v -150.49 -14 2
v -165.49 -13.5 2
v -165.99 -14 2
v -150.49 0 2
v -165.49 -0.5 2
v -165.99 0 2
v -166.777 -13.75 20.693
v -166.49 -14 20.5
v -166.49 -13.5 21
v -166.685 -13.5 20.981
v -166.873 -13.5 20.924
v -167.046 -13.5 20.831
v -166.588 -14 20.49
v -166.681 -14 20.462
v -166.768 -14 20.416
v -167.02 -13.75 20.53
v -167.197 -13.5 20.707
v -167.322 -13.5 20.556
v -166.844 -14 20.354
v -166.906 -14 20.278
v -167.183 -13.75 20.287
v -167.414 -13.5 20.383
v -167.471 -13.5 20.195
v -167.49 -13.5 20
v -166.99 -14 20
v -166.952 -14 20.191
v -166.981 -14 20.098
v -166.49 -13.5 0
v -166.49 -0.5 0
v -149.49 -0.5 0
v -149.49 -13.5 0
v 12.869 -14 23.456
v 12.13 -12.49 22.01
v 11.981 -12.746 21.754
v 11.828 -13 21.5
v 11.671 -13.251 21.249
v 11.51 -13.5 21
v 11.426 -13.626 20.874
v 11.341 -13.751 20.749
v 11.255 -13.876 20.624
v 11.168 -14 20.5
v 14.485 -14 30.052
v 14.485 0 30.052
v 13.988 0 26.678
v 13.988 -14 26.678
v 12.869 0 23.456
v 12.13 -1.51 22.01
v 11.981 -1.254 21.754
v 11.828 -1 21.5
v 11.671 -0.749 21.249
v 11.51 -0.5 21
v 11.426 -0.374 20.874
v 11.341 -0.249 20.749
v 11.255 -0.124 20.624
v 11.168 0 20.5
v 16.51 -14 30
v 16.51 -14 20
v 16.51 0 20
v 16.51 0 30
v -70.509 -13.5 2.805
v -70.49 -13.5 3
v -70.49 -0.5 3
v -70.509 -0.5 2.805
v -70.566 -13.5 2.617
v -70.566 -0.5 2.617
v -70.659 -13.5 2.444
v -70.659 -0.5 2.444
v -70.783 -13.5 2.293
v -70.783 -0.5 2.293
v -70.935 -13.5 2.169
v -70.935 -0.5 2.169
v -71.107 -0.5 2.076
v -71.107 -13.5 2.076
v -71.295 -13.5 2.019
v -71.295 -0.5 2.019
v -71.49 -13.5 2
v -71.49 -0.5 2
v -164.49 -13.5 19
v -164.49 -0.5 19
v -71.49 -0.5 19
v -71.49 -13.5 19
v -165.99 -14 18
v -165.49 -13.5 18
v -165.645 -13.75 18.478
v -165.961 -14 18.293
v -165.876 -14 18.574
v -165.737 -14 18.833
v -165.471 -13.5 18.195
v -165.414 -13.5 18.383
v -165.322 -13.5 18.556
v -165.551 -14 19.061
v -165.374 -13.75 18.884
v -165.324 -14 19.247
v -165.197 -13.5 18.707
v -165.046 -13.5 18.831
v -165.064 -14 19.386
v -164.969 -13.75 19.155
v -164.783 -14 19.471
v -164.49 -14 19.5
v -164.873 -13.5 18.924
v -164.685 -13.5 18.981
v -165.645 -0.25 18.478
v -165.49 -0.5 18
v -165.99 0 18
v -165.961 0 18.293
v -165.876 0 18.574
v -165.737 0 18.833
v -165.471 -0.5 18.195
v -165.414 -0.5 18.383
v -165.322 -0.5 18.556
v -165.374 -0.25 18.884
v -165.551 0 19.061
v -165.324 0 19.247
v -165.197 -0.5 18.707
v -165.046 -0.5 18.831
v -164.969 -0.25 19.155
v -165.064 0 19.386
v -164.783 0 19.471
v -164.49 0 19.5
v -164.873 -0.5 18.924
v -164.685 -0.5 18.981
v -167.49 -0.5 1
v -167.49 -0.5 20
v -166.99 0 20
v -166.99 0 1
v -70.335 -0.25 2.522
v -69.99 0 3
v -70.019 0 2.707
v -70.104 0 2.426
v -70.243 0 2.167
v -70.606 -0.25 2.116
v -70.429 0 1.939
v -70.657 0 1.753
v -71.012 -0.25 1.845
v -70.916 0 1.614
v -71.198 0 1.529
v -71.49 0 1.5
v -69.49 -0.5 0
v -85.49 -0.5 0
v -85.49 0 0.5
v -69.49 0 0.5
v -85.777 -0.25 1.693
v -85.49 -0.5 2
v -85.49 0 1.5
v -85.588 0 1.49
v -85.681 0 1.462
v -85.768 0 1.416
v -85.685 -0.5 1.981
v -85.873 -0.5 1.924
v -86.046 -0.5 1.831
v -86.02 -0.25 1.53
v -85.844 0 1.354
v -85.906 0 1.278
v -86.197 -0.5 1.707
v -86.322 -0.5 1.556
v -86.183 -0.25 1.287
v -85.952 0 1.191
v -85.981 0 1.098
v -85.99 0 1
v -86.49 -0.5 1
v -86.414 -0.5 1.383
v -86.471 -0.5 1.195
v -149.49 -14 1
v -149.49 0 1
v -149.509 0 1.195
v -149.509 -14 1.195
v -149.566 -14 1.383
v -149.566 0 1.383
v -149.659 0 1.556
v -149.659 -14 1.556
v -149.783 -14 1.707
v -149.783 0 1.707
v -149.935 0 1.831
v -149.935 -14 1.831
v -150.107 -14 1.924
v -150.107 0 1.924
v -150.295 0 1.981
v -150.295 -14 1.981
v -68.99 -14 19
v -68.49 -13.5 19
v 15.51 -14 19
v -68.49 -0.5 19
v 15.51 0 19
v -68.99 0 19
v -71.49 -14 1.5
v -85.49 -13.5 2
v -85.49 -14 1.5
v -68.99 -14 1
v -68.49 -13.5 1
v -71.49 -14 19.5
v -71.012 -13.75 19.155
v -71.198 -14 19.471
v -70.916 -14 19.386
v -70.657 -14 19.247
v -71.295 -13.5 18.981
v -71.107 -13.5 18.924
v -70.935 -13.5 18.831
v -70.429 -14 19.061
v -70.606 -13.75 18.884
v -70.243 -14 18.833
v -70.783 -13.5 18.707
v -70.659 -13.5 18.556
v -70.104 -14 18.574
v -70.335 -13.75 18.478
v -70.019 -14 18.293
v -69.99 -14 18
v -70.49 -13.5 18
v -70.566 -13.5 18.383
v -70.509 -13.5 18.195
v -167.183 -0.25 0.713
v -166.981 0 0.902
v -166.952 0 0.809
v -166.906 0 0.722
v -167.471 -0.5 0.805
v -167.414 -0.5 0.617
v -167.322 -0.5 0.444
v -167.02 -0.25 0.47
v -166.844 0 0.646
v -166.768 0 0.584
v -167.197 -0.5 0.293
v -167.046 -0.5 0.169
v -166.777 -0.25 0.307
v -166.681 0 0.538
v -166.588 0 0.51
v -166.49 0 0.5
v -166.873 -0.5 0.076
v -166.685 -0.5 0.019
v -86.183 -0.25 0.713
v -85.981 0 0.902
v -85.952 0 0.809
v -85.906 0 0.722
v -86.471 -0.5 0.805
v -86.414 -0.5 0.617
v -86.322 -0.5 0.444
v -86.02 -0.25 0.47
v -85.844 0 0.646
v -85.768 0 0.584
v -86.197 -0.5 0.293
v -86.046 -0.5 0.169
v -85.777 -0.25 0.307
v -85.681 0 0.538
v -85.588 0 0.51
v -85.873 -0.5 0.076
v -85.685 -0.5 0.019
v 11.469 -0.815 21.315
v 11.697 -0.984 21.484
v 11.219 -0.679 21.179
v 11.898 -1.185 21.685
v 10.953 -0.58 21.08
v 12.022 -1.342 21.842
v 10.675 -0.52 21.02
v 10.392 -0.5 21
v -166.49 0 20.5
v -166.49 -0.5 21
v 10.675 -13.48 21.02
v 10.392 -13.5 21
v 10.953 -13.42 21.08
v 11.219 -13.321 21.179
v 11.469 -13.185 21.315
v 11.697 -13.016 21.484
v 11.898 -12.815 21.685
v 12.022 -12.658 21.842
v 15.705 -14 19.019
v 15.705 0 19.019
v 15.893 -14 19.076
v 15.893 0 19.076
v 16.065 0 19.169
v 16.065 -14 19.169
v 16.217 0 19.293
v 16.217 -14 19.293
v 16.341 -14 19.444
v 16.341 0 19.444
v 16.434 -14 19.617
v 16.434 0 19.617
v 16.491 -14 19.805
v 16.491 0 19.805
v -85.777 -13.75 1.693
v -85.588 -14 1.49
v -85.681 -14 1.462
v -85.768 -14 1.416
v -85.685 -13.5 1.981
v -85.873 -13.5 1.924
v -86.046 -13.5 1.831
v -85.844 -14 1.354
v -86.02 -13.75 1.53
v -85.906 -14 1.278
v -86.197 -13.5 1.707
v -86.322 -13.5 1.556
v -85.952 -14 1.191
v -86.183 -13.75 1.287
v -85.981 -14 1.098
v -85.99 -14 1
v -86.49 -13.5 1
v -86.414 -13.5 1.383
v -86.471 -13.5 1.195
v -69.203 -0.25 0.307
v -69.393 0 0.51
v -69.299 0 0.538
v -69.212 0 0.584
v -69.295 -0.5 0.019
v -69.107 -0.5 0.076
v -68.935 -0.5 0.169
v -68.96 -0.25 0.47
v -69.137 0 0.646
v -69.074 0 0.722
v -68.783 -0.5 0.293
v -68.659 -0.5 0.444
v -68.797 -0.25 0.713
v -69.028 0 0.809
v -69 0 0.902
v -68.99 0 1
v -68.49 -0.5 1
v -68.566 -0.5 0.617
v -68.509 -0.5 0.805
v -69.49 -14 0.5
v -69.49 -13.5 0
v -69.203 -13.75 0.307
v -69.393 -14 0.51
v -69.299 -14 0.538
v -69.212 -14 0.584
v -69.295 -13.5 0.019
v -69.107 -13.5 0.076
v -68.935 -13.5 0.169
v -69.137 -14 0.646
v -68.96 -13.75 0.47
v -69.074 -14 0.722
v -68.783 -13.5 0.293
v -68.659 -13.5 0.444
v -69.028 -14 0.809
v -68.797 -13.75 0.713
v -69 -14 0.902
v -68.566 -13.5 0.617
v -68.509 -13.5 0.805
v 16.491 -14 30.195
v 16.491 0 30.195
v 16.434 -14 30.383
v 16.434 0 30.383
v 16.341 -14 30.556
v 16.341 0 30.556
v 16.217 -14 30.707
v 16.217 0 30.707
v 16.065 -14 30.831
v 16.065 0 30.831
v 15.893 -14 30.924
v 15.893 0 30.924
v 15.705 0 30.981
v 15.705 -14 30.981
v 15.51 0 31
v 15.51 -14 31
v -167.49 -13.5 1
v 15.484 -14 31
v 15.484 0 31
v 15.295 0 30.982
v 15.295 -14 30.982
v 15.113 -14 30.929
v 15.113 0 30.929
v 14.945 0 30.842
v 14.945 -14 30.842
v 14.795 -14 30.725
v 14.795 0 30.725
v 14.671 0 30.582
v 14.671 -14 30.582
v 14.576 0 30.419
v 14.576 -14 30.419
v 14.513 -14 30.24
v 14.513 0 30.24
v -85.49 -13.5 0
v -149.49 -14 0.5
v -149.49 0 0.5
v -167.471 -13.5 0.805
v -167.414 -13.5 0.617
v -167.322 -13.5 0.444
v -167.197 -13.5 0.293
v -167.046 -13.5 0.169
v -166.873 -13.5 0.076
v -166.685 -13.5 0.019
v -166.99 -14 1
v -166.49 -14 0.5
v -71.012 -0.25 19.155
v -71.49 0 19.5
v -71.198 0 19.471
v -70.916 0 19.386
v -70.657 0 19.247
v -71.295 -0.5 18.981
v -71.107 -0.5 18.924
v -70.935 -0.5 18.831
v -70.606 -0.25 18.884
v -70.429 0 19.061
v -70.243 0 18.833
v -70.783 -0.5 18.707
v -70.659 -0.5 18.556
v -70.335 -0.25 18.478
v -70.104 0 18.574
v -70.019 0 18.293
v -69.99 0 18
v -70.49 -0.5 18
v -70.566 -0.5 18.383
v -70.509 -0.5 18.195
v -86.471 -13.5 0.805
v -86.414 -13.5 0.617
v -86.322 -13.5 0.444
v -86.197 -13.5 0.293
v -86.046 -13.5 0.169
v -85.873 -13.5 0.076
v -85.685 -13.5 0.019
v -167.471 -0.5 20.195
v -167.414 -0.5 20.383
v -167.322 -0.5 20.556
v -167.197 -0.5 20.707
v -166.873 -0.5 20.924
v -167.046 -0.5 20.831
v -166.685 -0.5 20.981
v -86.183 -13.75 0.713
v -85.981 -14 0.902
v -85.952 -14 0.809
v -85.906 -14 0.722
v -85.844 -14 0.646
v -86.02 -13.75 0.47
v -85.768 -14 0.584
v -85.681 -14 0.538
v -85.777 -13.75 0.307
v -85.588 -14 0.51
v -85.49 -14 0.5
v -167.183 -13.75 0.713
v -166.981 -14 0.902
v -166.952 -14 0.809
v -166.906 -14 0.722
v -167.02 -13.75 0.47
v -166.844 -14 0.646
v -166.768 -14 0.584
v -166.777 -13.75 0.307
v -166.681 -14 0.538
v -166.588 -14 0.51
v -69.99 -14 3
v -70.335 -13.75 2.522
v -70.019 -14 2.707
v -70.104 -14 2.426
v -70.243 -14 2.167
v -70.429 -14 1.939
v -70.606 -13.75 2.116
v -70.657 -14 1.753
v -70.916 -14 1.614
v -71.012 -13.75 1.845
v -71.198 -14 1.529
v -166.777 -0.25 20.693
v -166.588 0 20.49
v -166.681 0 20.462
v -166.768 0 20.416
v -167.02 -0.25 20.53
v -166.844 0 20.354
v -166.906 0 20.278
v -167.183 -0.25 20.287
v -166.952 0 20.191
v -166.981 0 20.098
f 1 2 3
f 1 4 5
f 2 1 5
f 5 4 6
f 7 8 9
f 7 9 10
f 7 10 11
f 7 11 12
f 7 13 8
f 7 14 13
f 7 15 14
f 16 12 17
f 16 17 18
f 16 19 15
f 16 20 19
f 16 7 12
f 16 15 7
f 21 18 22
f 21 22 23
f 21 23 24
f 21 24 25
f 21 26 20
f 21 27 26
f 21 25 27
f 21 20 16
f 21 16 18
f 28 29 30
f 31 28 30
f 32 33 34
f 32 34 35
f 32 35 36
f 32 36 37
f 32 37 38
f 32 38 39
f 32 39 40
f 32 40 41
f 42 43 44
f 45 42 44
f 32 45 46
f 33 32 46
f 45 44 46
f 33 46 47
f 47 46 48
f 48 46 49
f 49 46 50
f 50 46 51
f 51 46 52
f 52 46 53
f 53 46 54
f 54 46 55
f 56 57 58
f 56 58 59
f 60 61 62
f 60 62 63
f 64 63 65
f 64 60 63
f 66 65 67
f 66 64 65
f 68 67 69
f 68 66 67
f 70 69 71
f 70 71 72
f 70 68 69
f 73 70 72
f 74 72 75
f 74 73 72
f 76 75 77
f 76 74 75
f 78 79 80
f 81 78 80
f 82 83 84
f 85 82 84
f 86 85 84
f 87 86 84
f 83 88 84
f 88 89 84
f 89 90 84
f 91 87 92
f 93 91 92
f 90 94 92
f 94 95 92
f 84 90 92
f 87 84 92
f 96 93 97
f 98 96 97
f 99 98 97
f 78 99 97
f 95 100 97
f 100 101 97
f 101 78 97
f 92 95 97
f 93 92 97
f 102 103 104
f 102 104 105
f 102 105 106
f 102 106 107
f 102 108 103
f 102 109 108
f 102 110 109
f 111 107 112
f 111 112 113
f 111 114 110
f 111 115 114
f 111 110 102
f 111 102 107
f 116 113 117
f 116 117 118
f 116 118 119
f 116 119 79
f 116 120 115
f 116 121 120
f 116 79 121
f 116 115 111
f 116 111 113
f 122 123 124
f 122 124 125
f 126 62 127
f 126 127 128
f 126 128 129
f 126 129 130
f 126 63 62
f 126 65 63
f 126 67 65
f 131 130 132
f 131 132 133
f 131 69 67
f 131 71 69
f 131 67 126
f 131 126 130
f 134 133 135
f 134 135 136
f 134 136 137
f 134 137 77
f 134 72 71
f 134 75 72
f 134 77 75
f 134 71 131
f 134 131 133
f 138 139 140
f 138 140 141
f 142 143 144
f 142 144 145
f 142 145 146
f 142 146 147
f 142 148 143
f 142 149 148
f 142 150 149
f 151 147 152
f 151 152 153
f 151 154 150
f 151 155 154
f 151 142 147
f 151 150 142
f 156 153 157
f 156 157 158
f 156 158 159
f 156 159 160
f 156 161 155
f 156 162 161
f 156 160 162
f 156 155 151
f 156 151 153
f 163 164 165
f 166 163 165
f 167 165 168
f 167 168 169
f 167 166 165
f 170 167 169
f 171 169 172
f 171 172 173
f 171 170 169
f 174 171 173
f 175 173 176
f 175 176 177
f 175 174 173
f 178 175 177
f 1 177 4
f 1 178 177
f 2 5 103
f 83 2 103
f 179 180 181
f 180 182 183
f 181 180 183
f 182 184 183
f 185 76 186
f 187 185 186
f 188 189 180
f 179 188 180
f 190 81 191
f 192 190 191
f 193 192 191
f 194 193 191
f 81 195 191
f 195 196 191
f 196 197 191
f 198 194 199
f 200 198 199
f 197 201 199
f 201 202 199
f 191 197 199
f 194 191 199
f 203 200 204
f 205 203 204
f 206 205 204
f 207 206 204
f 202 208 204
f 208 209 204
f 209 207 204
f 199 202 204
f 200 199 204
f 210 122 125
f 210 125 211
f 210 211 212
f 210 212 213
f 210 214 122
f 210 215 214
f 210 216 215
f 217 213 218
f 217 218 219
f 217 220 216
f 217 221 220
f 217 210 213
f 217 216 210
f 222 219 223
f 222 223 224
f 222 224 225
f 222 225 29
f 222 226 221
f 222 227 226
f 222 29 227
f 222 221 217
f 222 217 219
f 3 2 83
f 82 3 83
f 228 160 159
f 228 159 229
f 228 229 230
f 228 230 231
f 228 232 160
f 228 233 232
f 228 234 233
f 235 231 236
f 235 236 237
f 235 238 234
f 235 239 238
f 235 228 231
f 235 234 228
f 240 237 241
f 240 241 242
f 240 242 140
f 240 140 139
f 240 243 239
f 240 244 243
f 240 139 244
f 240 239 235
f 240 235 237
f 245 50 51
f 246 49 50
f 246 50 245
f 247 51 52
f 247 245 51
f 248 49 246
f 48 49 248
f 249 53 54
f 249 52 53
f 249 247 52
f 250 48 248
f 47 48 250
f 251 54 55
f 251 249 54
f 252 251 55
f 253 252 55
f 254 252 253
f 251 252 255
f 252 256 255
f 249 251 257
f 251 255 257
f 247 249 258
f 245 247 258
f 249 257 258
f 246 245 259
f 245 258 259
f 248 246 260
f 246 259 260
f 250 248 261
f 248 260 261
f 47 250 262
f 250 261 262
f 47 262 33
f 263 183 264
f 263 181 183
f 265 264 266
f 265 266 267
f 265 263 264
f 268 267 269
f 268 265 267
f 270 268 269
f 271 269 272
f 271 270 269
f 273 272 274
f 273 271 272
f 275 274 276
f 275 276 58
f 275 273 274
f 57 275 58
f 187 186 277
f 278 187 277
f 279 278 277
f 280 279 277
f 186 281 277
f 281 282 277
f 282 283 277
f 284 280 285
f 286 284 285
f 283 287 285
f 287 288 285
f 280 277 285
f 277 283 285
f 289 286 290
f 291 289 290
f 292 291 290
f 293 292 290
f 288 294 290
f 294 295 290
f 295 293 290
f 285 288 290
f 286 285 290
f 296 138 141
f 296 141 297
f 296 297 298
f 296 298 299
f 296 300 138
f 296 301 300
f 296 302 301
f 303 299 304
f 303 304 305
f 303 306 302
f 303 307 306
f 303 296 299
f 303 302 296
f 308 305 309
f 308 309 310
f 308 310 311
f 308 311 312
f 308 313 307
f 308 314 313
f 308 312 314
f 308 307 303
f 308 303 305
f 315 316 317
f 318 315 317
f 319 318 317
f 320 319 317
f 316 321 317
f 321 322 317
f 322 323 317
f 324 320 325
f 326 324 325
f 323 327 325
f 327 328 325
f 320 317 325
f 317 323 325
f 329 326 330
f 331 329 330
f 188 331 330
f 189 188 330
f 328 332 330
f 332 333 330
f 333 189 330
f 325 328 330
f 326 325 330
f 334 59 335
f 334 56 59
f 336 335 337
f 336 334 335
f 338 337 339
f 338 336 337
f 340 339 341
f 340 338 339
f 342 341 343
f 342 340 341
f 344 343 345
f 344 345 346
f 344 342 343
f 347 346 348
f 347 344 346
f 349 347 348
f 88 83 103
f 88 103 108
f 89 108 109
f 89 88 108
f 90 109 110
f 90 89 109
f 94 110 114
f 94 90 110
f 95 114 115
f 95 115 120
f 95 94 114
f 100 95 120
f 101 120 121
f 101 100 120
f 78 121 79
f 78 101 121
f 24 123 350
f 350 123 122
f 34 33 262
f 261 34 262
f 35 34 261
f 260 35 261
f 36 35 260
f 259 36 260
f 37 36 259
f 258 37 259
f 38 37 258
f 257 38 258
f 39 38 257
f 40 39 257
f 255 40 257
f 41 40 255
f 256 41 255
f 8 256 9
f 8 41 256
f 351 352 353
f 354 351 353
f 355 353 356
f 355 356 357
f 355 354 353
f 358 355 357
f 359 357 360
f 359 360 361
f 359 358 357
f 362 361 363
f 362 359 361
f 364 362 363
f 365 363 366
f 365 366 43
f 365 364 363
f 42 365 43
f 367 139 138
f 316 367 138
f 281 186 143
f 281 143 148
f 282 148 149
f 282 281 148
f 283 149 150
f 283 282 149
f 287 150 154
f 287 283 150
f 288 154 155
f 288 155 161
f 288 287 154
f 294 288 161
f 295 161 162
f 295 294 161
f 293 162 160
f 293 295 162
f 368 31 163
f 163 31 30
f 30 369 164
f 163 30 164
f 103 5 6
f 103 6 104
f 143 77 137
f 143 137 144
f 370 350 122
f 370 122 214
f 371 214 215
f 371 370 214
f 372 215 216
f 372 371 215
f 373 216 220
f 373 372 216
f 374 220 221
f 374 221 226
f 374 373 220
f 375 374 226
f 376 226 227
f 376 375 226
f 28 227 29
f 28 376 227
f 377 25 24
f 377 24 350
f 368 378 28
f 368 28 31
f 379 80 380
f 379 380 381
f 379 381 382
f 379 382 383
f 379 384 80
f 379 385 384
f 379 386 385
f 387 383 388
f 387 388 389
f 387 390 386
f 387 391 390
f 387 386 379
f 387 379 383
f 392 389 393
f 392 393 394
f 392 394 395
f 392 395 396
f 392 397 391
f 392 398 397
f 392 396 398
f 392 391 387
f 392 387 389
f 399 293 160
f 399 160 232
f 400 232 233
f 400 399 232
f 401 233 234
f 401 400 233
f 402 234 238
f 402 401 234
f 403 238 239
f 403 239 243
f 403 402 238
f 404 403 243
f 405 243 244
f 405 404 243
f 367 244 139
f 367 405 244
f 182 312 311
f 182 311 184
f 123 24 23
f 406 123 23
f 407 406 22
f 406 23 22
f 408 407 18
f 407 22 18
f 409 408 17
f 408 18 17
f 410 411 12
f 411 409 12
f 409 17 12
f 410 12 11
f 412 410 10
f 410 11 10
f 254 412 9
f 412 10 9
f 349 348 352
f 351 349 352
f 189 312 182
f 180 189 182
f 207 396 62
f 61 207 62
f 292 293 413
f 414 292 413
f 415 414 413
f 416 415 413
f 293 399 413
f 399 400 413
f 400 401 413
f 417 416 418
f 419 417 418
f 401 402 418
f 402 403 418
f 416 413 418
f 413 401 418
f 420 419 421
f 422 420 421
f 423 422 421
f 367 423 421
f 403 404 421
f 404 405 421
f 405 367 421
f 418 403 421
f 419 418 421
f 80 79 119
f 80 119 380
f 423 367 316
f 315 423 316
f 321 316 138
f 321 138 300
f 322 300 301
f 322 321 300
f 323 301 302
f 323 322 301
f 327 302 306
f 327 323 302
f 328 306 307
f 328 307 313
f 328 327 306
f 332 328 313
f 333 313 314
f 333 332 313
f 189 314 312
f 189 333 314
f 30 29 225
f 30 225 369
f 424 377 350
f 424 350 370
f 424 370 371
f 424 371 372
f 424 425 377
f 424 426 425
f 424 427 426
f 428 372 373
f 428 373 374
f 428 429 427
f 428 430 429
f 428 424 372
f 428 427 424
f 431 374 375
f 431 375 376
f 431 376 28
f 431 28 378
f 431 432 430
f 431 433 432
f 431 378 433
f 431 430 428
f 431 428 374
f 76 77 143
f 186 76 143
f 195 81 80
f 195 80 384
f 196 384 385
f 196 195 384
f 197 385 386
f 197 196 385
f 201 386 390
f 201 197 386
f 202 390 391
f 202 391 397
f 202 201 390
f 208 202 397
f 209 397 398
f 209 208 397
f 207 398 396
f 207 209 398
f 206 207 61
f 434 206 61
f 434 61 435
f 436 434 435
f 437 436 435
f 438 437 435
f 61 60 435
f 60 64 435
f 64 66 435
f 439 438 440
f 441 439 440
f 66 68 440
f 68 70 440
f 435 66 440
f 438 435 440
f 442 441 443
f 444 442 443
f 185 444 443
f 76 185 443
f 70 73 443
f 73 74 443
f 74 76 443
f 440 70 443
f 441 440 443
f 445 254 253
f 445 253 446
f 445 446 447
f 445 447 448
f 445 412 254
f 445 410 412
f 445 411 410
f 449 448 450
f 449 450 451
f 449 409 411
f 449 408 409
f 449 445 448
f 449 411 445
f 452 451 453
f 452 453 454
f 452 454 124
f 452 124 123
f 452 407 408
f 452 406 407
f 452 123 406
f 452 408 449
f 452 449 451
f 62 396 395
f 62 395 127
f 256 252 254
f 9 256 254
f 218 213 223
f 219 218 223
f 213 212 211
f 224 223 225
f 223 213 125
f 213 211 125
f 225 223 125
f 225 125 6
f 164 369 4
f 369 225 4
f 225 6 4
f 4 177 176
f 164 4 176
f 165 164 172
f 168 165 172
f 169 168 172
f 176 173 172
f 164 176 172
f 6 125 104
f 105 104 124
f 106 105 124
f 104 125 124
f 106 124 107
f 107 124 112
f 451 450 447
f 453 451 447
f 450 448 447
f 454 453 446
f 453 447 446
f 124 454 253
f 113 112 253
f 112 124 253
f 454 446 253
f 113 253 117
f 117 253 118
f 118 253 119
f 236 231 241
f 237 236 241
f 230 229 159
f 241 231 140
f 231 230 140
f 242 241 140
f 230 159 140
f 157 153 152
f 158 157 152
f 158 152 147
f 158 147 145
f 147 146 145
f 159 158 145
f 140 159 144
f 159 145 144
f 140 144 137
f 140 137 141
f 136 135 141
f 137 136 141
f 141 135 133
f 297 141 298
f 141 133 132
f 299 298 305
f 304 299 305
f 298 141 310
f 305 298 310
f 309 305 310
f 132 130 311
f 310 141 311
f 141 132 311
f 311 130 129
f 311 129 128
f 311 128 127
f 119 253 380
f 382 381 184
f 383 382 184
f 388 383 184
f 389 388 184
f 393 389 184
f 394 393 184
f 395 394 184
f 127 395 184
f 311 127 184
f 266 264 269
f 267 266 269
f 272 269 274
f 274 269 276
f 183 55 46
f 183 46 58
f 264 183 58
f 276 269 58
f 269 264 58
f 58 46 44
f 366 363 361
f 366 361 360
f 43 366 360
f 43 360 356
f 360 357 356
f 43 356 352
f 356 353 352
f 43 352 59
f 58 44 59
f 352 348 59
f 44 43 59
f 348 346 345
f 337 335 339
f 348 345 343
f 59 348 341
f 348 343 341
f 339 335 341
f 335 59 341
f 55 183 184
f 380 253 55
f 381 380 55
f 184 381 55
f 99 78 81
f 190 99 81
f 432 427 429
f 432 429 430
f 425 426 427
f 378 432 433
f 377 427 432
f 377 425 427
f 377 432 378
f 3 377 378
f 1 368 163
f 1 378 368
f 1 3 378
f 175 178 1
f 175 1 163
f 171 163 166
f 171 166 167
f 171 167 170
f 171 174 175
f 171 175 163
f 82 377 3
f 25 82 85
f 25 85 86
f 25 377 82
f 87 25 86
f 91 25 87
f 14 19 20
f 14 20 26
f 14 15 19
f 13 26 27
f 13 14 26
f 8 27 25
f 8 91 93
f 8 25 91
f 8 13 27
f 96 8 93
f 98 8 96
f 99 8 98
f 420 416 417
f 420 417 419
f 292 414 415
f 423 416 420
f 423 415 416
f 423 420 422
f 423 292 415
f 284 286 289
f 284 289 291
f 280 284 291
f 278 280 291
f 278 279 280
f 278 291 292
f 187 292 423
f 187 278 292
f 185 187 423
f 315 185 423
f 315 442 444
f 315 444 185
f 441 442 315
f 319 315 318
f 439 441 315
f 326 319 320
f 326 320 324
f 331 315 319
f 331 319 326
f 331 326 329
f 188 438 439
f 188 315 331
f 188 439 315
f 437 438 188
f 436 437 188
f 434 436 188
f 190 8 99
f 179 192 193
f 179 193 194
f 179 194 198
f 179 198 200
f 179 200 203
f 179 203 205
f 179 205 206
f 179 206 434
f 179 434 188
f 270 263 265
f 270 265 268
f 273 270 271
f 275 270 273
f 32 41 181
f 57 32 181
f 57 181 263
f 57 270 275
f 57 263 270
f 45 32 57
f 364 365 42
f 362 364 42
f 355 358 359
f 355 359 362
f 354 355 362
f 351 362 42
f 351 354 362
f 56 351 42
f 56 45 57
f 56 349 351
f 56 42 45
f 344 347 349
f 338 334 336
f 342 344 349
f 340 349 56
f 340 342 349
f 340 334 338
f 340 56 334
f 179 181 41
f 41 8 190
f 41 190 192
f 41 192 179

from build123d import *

# Parameters (mm, degrees)
F1_DEPTH = 14
F2_R     = 0.99999
F3_SIZE  = 0.5
F4_R     = 2


# Not quite as in the source:
# - a fillet or chamfer is up to 0.001 mm smaller than in the source, because OpenCascade refuses the exact size


with BuildPart() as f1:
    # F0 (on Front) → F1 (new body)
    with BuildSketch(Plane.XZ):
        with BuildLine():
            Line((-68.4901475161, 21), (-167.4901475161, 21))
            Line((-167.4901475161, 21), (-167.4901475161, 0))
            Line((-167.4901475161, 0), (-149.4901475161, 0))
            Line((-149.4901475161, 0), (-149.4901475161, 2))
            Line((-149.4901475161, 2), (-165.4901475161, 2))
            Line((-165.4901475161, 2), (-165.4901475161, 19))
            Line((-165.4901475161, 19), (-70.4901475161, 19))
            Line((-70.4901475161, 19), (-70.4901475161, 2))
            Line((-70.4901475161, 2), (-86.4901475161, 2))
            Line((-86.4901475161, 2), (-86.4901475161, 0))
            Line((-86.4901475161, 0), (-68.4901475161, 0))
            Line((-68.4901475161, 0), (-68.4901475161, 19))
            Line((-68.4901475161, 19), (16.5098524839, 19))
            Line((16.5098524839, 19), (16.5098524839, 21))
            Line((16.5098524839, 21), (16.5098524839, 31))
            Line((16.5098524839, 31), (14.5098524839, 31))
            ThreePointArc((14.5098524839, 31), (13.7436966654, 25.7798467455), (11.5098524839, 21))
            Line((11.5098524839, 21), (-63.147776881, 21))
            Line((-63.147776881, 21), (-68.4901475161, 21))
        make_face()
    extrude(amount=F1_DEPTH)

    # F2 (radius 1 in the source; OpenCascade refuses exactly that, so slightly less here)
    f2_edges = [f1.edges().sort_by_distance(p)[0] for p in [
        (14.509852, -7, 31),
        (16.509852, -7, 31),
        (16.509852, -7, 19),
        (-70.490148, -7, 2),
        (-70.490148, -7, 19),
        (-86.490148, -7, 2),
        (-86.490148, -7, 0),
        (-68.490148, -7, 0),
        (-165.490148, -7, 19),
        (-149.490148, -7, 2),
        (-167.490148, -7, 0),
        (-167.490148, -7, 21),
    ]]
    fillet(f2_edges, radius=F2_R)

    # F3
    f3_edges = [f1.edges().sort_by_distance(p)[0] for p in [
        (-77.490153, 0, 21),
        (-117.990148, 0, 19),
        (-167.490148, -14, 10.5),
        (-68.490148, -14, 9.999995),
    ]]
    chamfer(f3_edges, length=F3_SIZE)

    # F4
    f4_edges = [f1.edges().sort_by_distance(p)[0] for p in [
        (11.509852, -7, 21),
    ]]
    fillet(f4_edges, radius=F4_R)


solid = f1.part
